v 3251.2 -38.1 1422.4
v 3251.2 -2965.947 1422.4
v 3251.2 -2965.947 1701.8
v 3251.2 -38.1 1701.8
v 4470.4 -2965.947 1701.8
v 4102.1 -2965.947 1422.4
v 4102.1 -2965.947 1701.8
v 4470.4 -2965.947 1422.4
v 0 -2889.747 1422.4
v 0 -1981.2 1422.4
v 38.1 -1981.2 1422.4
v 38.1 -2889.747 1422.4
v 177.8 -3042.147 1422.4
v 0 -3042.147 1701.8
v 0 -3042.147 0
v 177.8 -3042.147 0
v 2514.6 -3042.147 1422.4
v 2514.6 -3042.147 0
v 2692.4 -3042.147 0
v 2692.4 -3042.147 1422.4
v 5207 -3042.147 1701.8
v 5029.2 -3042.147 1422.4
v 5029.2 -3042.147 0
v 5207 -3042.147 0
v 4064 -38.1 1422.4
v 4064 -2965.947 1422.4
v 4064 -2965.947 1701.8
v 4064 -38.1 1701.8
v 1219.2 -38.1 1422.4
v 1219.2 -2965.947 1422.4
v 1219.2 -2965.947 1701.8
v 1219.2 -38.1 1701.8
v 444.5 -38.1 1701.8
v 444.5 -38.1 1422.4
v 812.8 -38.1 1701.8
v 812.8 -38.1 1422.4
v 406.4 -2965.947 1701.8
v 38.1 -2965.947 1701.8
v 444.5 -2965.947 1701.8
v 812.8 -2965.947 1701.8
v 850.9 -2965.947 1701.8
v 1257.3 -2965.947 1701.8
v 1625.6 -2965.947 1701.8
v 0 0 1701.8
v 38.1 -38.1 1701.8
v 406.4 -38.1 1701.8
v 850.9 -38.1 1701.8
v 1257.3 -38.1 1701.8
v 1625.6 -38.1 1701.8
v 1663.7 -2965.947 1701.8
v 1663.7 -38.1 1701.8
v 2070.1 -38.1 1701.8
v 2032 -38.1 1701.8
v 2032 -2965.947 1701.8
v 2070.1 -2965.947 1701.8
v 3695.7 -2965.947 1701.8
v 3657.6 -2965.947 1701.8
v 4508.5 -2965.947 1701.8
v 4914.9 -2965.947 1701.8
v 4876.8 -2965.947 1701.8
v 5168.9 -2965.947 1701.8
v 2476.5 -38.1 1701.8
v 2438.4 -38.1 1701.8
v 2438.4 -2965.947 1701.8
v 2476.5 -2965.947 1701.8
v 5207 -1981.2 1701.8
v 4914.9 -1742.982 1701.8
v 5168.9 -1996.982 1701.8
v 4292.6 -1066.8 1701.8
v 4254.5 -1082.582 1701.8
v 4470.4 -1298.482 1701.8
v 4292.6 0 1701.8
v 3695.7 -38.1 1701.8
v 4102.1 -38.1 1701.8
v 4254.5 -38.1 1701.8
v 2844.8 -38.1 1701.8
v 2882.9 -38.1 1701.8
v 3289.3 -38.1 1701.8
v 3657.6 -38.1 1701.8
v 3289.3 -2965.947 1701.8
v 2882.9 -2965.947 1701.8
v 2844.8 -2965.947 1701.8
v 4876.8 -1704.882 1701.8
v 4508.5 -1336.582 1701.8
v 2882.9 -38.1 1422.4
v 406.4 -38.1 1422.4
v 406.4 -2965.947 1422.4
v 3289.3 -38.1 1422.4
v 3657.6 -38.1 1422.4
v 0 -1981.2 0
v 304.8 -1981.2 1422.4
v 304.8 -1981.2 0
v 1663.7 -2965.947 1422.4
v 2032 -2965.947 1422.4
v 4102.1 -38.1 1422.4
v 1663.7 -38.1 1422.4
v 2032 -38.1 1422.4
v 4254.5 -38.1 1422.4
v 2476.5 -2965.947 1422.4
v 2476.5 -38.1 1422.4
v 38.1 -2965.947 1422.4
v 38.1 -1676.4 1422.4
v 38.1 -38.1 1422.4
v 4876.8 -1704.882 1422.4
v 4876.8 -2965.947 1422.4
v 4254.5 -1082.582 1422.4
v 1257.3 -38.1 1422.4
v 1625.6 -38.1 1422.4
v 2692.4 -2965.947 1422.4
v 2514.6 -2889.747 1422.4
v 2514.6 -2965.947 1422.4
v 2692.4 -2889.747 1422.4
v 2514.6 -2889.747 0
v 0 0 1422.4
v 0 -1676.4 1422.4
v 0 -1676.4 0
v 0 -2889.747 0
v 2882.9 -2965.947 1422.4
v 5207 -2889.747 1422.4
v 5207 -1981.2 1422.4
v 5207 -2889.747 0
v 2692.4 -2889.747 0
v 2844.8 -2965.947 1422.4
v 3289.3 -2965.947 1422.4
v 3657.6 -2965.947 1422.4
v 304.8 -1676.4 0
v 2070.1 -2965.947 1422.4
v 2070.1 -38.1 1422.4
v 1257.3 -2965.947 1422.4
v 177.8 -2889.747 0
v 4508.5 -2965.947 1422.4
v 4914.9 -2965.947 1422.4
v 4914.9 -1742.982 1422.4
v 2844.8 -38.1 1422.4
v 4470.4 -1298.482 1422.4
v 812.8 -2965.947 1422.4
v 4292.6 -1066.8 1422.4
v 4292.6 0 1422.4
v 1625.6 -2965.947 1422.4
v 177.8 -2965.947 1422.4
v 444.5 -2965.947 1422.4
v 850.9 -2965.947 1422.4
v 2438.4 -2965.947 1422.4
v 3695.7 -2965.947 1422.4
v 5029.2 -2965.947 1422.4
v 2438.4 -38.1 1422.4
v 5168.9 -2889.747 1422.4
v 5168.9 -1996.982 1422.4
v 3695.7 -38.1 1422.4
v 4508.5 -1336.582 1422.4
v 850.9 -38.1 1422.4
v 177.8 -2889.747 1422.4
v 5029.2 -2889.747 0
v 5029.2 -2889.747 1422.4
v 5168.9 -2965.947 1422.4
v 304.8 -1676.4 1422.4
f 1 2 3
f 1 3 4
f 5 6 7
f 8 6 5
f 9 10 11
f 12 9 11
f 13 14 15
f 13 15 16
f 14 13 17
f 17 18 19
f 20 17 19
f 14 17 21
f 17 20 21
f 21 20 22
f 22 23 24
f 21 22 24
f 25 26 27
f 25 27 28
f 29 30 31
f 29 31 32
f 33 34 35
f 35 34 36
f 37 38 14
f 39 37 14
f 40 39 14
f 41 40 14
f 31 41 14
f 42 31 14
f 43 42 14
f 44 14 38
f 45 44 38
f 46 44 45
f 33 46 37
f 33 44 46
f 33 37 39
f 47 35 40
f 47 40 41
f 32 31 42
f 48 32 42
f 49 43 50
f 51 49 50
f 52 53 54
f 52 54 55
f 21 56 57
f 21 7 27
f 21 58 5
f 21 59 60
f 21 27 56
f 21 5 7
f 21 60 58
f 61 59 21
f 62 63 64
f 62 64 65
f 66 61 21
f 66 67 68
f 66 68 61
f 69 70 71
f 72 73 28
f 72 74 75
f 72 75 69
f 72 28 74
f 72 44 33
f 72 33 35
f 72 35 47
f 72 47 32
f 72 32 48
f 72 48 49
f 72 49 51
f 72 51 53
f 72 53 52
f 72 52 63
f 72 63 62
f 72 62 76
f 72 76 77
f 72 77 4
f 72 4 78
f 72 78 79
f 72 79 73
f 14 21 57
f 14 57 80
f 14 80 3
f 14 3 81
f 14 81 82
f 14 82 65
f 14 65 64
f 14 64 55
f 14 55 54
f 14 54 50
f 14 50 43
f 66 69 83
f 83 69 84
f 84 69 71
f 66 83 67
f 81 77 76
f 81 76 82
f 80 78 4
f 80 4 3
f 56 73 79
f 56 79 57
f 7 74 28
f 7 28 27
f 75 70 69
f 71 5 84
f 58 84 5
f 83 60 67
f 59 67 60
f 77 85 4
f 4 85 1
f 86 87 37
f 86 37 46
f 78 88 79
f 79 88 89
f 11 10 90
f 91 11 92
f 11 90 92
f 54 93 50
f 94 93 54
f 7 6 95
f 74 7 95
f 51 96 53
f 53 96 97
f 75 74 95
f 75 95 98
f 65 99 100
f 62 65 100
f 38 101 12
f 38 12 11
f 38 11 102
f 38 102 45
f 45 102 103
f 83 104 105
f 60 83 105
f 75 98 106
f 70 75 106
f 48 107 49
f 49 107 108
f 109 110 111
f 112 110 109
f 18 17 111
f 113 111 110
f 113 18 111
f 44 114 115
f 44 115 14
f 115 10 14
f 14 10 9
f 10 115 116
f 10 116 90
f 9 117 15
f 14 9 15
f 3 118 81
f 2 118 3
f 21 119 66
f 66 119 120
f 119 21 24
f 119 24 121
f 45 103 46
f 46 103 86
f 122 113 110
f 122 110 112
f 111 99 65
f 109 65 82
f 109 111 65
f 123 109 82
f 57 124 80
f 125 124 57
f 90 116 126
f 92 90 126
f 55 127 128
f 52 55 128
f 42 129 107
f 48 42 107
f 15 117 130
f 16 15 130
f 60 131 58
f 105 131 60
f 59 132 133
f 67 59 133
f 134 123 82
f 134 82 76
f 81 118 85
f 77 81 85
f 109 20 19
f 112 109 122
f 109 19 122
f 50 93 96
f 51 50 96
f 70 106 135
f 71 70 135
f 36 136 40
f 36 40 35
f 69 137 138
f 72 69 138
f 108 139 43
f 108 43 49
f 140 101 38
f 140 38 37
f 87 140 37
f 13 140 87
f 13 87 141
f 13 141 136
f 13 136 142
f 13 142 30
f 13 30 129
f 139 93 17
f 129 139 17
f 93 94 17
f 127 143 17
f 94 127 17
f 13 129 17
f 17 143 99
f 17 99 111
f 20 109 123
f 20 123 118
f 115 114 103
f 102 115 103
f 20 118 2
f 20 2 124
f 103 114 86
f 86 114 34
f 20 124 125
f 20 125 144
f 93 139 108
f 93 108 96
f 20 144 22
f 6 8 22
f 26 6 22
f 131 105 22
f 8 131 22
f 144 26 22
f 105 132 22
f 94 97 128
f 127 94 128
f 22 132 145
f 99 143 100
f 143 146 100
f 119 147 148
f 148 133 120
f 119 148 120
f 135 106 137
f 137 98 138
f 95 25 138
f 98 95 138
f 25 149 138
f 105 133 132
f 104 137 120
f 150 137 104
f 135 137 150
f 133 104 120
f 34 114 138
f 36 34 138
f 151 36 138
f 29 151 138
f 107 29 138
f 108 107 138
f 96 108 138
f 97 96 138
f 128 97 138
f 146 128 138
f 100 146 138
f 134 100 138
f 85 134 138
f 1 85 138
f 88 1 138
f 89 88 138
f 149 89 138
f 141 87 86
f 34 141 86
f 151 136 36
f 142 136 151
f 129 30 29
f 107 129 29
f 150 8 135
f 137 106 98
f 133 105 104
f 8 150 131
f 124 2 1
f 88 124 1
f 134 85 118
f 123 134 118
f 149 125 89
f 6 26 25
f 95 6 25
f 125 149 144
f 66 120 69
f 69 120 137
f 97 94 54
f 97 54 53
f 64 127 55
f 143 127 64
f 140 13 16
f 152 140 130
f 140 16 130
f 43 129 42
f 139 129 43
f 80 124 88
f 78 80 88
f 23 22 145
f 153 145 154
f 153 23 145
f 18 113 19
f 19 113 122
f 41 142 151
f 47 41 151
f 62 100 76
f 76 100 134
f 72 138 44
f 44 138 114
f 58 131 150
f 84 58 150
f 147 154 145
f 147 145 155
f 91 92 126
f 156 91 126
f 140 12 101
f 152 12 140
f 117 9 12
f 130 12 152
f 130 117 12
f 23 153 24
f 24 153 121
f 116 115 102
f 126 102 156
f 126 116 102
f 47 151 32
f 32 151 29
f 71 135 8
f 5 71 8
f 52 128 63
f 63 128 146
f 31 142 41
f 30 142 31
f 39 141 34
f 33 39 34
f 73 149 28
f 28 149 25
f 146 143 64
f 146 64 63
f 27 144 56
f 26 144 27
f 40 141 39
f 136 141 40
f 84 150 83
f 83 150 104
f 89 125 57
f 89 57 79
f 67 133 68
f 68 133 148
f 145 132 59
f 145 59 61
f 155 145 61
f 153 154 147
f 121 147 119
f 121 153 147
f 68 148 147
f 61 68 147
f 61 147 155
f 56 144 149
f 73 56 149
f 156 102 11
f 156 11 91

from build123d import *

# Parameters (mm, degrees)
F0_W     = 304.8
F0_H     = 304.8
F1_DEPTH = 1422.4
F0_W_2   = 177.8
F0_H_2   = 152.4
F3_DEPTH = 279.4
F4_W     = 5130.8
F4_H     = 38.1
F5_DEPTH = 279.4
F6_W     = 38.1
F6_H     = 2927.8466365912
F7_DEPTH = 279.4


with BuildPart() as f1:
    # F0 (on Top) → F1 (new body)
    with BuildSketch(Plane.XY):
        with Locations((152.4, -1828.8)):
            Rectangle(F0_W, F0_H)
    extrude(amount=F1_DEPTH)



with BuildPart() as f1b:
    # F0 (on Top) → F1, piece 2 (new body)
    with BuildSketch(Plane.XY):
        with Locations((88.9, -2965.9466365912)):
            Rectangle(F0_W_2, F0_H_2)
    extrude(amount=F1_DEPTH)


with BuildPart() as f1c:
    # F0 (on Top) → F1, piece 3 (new body)
    with BuildSketch(Plane.XY):
        with Locations((2603.5, -2965.9466365912)):
            Rectangle(F0_W_2, F0_H_2)
    extrude(amount=F1_DEPTH)


with BuildPart() as f1d:
    # F0 (on Top) → F1, piece 4 (new body)
    with BuildSketch(Plane.XY):
        with Locations((5118.1, -2965.9466365912)):
            Rectangle(F0_W_2, F0_H_2)
    extrude(amount=F1_DEPTH)


with BuildPart() as f1_1:
    add(f1.part)

    add(f1b.part)  # F3 merges F1b

    add(f1c.part)  # F3 merges F1c

    add(f1d.part)  # F3 merges F1d
    # F2 (on face) → F3 (join)
    with BuildSketch(Plane.XY.offset(1422.4)):
        Polygon((4292.6, 0), (0, 0), (0, -3042.1466365912), (5207, -3042.1466365912), (5207, -1981.2), (4292.6, -1066.8), align=None)
        Polygon((38.1, -38.1), (4254.5, -38.1), (4254.5, -1082.5815367264), (5168.9, -1996.9815367264), (5168.9, -3004.0466365912), (38.1, -3004.0466365912), align=None, mode=Mode.SUBTRACT)
    extrude(amount=F3_DEPTH)

    # F4 (on face) → F5 (join, through all)
    with BuildSketch(Plane.XY.offset(1422.4)):
        with Locations((2603.5, -2984.9966365912)):
            Rectangle(F4_W, F4_H)
    extrude(amount=F5_DEPTH)

    # F6 (on face) → F7 (join, through all)
    with BuildSketch(Plane.XY.offset(1422.4)):
        with Locations((425.45, -1502.0233182956)):
            Rectangle(F6_W, F6_H)
        with Locations((831.85, -1502.0233182956)):
            Rectangle(F6_W, F6_H)
        with Locations((1238.25, -1502.0233182956)):
            Rectangle(F6_W, F6_H)
        with Locations((1644.65, -1502.0233182956)):
            Rectangle(F6_W, F6_H)
        with Locations((2051.05, -1502.0233182956)):
            Rectangle(F6_W, F6_H)
        with Locations((2457.45, -1502.0233182956)):
            Rectangle(F6_W, F6_H)
        with Locations((2863.85, -1502.0233182956)):
            Rectangle(F6_W, F6_H)
        with Locations((3270.25, -1502.0233182956)):
            Rectangle(F6_W, F6_H)
        with Locations((3676.65, -1502.0233182956)):
            Rectangle(F6_W, F6_H)
        with Locations((4083.05, -1502.0233182956)):
            Rectangle(F6_W, F6_H)
        Polygon((4470.4, -1298.4815367264), (4470.4, -2965.9466365912), (4508.5, -2965.9466365912), (4508.5, -1336.5815367264), align=None)
        Polygon((4876.8, -1704.8815367264), (4876.8, -2965.9466365912), (4914.9, -2965.9466365912), (4914.9, -1742.9815367264), align=None)
    extrude(amount=F7_DEPTH)


solid = f1_1.part
